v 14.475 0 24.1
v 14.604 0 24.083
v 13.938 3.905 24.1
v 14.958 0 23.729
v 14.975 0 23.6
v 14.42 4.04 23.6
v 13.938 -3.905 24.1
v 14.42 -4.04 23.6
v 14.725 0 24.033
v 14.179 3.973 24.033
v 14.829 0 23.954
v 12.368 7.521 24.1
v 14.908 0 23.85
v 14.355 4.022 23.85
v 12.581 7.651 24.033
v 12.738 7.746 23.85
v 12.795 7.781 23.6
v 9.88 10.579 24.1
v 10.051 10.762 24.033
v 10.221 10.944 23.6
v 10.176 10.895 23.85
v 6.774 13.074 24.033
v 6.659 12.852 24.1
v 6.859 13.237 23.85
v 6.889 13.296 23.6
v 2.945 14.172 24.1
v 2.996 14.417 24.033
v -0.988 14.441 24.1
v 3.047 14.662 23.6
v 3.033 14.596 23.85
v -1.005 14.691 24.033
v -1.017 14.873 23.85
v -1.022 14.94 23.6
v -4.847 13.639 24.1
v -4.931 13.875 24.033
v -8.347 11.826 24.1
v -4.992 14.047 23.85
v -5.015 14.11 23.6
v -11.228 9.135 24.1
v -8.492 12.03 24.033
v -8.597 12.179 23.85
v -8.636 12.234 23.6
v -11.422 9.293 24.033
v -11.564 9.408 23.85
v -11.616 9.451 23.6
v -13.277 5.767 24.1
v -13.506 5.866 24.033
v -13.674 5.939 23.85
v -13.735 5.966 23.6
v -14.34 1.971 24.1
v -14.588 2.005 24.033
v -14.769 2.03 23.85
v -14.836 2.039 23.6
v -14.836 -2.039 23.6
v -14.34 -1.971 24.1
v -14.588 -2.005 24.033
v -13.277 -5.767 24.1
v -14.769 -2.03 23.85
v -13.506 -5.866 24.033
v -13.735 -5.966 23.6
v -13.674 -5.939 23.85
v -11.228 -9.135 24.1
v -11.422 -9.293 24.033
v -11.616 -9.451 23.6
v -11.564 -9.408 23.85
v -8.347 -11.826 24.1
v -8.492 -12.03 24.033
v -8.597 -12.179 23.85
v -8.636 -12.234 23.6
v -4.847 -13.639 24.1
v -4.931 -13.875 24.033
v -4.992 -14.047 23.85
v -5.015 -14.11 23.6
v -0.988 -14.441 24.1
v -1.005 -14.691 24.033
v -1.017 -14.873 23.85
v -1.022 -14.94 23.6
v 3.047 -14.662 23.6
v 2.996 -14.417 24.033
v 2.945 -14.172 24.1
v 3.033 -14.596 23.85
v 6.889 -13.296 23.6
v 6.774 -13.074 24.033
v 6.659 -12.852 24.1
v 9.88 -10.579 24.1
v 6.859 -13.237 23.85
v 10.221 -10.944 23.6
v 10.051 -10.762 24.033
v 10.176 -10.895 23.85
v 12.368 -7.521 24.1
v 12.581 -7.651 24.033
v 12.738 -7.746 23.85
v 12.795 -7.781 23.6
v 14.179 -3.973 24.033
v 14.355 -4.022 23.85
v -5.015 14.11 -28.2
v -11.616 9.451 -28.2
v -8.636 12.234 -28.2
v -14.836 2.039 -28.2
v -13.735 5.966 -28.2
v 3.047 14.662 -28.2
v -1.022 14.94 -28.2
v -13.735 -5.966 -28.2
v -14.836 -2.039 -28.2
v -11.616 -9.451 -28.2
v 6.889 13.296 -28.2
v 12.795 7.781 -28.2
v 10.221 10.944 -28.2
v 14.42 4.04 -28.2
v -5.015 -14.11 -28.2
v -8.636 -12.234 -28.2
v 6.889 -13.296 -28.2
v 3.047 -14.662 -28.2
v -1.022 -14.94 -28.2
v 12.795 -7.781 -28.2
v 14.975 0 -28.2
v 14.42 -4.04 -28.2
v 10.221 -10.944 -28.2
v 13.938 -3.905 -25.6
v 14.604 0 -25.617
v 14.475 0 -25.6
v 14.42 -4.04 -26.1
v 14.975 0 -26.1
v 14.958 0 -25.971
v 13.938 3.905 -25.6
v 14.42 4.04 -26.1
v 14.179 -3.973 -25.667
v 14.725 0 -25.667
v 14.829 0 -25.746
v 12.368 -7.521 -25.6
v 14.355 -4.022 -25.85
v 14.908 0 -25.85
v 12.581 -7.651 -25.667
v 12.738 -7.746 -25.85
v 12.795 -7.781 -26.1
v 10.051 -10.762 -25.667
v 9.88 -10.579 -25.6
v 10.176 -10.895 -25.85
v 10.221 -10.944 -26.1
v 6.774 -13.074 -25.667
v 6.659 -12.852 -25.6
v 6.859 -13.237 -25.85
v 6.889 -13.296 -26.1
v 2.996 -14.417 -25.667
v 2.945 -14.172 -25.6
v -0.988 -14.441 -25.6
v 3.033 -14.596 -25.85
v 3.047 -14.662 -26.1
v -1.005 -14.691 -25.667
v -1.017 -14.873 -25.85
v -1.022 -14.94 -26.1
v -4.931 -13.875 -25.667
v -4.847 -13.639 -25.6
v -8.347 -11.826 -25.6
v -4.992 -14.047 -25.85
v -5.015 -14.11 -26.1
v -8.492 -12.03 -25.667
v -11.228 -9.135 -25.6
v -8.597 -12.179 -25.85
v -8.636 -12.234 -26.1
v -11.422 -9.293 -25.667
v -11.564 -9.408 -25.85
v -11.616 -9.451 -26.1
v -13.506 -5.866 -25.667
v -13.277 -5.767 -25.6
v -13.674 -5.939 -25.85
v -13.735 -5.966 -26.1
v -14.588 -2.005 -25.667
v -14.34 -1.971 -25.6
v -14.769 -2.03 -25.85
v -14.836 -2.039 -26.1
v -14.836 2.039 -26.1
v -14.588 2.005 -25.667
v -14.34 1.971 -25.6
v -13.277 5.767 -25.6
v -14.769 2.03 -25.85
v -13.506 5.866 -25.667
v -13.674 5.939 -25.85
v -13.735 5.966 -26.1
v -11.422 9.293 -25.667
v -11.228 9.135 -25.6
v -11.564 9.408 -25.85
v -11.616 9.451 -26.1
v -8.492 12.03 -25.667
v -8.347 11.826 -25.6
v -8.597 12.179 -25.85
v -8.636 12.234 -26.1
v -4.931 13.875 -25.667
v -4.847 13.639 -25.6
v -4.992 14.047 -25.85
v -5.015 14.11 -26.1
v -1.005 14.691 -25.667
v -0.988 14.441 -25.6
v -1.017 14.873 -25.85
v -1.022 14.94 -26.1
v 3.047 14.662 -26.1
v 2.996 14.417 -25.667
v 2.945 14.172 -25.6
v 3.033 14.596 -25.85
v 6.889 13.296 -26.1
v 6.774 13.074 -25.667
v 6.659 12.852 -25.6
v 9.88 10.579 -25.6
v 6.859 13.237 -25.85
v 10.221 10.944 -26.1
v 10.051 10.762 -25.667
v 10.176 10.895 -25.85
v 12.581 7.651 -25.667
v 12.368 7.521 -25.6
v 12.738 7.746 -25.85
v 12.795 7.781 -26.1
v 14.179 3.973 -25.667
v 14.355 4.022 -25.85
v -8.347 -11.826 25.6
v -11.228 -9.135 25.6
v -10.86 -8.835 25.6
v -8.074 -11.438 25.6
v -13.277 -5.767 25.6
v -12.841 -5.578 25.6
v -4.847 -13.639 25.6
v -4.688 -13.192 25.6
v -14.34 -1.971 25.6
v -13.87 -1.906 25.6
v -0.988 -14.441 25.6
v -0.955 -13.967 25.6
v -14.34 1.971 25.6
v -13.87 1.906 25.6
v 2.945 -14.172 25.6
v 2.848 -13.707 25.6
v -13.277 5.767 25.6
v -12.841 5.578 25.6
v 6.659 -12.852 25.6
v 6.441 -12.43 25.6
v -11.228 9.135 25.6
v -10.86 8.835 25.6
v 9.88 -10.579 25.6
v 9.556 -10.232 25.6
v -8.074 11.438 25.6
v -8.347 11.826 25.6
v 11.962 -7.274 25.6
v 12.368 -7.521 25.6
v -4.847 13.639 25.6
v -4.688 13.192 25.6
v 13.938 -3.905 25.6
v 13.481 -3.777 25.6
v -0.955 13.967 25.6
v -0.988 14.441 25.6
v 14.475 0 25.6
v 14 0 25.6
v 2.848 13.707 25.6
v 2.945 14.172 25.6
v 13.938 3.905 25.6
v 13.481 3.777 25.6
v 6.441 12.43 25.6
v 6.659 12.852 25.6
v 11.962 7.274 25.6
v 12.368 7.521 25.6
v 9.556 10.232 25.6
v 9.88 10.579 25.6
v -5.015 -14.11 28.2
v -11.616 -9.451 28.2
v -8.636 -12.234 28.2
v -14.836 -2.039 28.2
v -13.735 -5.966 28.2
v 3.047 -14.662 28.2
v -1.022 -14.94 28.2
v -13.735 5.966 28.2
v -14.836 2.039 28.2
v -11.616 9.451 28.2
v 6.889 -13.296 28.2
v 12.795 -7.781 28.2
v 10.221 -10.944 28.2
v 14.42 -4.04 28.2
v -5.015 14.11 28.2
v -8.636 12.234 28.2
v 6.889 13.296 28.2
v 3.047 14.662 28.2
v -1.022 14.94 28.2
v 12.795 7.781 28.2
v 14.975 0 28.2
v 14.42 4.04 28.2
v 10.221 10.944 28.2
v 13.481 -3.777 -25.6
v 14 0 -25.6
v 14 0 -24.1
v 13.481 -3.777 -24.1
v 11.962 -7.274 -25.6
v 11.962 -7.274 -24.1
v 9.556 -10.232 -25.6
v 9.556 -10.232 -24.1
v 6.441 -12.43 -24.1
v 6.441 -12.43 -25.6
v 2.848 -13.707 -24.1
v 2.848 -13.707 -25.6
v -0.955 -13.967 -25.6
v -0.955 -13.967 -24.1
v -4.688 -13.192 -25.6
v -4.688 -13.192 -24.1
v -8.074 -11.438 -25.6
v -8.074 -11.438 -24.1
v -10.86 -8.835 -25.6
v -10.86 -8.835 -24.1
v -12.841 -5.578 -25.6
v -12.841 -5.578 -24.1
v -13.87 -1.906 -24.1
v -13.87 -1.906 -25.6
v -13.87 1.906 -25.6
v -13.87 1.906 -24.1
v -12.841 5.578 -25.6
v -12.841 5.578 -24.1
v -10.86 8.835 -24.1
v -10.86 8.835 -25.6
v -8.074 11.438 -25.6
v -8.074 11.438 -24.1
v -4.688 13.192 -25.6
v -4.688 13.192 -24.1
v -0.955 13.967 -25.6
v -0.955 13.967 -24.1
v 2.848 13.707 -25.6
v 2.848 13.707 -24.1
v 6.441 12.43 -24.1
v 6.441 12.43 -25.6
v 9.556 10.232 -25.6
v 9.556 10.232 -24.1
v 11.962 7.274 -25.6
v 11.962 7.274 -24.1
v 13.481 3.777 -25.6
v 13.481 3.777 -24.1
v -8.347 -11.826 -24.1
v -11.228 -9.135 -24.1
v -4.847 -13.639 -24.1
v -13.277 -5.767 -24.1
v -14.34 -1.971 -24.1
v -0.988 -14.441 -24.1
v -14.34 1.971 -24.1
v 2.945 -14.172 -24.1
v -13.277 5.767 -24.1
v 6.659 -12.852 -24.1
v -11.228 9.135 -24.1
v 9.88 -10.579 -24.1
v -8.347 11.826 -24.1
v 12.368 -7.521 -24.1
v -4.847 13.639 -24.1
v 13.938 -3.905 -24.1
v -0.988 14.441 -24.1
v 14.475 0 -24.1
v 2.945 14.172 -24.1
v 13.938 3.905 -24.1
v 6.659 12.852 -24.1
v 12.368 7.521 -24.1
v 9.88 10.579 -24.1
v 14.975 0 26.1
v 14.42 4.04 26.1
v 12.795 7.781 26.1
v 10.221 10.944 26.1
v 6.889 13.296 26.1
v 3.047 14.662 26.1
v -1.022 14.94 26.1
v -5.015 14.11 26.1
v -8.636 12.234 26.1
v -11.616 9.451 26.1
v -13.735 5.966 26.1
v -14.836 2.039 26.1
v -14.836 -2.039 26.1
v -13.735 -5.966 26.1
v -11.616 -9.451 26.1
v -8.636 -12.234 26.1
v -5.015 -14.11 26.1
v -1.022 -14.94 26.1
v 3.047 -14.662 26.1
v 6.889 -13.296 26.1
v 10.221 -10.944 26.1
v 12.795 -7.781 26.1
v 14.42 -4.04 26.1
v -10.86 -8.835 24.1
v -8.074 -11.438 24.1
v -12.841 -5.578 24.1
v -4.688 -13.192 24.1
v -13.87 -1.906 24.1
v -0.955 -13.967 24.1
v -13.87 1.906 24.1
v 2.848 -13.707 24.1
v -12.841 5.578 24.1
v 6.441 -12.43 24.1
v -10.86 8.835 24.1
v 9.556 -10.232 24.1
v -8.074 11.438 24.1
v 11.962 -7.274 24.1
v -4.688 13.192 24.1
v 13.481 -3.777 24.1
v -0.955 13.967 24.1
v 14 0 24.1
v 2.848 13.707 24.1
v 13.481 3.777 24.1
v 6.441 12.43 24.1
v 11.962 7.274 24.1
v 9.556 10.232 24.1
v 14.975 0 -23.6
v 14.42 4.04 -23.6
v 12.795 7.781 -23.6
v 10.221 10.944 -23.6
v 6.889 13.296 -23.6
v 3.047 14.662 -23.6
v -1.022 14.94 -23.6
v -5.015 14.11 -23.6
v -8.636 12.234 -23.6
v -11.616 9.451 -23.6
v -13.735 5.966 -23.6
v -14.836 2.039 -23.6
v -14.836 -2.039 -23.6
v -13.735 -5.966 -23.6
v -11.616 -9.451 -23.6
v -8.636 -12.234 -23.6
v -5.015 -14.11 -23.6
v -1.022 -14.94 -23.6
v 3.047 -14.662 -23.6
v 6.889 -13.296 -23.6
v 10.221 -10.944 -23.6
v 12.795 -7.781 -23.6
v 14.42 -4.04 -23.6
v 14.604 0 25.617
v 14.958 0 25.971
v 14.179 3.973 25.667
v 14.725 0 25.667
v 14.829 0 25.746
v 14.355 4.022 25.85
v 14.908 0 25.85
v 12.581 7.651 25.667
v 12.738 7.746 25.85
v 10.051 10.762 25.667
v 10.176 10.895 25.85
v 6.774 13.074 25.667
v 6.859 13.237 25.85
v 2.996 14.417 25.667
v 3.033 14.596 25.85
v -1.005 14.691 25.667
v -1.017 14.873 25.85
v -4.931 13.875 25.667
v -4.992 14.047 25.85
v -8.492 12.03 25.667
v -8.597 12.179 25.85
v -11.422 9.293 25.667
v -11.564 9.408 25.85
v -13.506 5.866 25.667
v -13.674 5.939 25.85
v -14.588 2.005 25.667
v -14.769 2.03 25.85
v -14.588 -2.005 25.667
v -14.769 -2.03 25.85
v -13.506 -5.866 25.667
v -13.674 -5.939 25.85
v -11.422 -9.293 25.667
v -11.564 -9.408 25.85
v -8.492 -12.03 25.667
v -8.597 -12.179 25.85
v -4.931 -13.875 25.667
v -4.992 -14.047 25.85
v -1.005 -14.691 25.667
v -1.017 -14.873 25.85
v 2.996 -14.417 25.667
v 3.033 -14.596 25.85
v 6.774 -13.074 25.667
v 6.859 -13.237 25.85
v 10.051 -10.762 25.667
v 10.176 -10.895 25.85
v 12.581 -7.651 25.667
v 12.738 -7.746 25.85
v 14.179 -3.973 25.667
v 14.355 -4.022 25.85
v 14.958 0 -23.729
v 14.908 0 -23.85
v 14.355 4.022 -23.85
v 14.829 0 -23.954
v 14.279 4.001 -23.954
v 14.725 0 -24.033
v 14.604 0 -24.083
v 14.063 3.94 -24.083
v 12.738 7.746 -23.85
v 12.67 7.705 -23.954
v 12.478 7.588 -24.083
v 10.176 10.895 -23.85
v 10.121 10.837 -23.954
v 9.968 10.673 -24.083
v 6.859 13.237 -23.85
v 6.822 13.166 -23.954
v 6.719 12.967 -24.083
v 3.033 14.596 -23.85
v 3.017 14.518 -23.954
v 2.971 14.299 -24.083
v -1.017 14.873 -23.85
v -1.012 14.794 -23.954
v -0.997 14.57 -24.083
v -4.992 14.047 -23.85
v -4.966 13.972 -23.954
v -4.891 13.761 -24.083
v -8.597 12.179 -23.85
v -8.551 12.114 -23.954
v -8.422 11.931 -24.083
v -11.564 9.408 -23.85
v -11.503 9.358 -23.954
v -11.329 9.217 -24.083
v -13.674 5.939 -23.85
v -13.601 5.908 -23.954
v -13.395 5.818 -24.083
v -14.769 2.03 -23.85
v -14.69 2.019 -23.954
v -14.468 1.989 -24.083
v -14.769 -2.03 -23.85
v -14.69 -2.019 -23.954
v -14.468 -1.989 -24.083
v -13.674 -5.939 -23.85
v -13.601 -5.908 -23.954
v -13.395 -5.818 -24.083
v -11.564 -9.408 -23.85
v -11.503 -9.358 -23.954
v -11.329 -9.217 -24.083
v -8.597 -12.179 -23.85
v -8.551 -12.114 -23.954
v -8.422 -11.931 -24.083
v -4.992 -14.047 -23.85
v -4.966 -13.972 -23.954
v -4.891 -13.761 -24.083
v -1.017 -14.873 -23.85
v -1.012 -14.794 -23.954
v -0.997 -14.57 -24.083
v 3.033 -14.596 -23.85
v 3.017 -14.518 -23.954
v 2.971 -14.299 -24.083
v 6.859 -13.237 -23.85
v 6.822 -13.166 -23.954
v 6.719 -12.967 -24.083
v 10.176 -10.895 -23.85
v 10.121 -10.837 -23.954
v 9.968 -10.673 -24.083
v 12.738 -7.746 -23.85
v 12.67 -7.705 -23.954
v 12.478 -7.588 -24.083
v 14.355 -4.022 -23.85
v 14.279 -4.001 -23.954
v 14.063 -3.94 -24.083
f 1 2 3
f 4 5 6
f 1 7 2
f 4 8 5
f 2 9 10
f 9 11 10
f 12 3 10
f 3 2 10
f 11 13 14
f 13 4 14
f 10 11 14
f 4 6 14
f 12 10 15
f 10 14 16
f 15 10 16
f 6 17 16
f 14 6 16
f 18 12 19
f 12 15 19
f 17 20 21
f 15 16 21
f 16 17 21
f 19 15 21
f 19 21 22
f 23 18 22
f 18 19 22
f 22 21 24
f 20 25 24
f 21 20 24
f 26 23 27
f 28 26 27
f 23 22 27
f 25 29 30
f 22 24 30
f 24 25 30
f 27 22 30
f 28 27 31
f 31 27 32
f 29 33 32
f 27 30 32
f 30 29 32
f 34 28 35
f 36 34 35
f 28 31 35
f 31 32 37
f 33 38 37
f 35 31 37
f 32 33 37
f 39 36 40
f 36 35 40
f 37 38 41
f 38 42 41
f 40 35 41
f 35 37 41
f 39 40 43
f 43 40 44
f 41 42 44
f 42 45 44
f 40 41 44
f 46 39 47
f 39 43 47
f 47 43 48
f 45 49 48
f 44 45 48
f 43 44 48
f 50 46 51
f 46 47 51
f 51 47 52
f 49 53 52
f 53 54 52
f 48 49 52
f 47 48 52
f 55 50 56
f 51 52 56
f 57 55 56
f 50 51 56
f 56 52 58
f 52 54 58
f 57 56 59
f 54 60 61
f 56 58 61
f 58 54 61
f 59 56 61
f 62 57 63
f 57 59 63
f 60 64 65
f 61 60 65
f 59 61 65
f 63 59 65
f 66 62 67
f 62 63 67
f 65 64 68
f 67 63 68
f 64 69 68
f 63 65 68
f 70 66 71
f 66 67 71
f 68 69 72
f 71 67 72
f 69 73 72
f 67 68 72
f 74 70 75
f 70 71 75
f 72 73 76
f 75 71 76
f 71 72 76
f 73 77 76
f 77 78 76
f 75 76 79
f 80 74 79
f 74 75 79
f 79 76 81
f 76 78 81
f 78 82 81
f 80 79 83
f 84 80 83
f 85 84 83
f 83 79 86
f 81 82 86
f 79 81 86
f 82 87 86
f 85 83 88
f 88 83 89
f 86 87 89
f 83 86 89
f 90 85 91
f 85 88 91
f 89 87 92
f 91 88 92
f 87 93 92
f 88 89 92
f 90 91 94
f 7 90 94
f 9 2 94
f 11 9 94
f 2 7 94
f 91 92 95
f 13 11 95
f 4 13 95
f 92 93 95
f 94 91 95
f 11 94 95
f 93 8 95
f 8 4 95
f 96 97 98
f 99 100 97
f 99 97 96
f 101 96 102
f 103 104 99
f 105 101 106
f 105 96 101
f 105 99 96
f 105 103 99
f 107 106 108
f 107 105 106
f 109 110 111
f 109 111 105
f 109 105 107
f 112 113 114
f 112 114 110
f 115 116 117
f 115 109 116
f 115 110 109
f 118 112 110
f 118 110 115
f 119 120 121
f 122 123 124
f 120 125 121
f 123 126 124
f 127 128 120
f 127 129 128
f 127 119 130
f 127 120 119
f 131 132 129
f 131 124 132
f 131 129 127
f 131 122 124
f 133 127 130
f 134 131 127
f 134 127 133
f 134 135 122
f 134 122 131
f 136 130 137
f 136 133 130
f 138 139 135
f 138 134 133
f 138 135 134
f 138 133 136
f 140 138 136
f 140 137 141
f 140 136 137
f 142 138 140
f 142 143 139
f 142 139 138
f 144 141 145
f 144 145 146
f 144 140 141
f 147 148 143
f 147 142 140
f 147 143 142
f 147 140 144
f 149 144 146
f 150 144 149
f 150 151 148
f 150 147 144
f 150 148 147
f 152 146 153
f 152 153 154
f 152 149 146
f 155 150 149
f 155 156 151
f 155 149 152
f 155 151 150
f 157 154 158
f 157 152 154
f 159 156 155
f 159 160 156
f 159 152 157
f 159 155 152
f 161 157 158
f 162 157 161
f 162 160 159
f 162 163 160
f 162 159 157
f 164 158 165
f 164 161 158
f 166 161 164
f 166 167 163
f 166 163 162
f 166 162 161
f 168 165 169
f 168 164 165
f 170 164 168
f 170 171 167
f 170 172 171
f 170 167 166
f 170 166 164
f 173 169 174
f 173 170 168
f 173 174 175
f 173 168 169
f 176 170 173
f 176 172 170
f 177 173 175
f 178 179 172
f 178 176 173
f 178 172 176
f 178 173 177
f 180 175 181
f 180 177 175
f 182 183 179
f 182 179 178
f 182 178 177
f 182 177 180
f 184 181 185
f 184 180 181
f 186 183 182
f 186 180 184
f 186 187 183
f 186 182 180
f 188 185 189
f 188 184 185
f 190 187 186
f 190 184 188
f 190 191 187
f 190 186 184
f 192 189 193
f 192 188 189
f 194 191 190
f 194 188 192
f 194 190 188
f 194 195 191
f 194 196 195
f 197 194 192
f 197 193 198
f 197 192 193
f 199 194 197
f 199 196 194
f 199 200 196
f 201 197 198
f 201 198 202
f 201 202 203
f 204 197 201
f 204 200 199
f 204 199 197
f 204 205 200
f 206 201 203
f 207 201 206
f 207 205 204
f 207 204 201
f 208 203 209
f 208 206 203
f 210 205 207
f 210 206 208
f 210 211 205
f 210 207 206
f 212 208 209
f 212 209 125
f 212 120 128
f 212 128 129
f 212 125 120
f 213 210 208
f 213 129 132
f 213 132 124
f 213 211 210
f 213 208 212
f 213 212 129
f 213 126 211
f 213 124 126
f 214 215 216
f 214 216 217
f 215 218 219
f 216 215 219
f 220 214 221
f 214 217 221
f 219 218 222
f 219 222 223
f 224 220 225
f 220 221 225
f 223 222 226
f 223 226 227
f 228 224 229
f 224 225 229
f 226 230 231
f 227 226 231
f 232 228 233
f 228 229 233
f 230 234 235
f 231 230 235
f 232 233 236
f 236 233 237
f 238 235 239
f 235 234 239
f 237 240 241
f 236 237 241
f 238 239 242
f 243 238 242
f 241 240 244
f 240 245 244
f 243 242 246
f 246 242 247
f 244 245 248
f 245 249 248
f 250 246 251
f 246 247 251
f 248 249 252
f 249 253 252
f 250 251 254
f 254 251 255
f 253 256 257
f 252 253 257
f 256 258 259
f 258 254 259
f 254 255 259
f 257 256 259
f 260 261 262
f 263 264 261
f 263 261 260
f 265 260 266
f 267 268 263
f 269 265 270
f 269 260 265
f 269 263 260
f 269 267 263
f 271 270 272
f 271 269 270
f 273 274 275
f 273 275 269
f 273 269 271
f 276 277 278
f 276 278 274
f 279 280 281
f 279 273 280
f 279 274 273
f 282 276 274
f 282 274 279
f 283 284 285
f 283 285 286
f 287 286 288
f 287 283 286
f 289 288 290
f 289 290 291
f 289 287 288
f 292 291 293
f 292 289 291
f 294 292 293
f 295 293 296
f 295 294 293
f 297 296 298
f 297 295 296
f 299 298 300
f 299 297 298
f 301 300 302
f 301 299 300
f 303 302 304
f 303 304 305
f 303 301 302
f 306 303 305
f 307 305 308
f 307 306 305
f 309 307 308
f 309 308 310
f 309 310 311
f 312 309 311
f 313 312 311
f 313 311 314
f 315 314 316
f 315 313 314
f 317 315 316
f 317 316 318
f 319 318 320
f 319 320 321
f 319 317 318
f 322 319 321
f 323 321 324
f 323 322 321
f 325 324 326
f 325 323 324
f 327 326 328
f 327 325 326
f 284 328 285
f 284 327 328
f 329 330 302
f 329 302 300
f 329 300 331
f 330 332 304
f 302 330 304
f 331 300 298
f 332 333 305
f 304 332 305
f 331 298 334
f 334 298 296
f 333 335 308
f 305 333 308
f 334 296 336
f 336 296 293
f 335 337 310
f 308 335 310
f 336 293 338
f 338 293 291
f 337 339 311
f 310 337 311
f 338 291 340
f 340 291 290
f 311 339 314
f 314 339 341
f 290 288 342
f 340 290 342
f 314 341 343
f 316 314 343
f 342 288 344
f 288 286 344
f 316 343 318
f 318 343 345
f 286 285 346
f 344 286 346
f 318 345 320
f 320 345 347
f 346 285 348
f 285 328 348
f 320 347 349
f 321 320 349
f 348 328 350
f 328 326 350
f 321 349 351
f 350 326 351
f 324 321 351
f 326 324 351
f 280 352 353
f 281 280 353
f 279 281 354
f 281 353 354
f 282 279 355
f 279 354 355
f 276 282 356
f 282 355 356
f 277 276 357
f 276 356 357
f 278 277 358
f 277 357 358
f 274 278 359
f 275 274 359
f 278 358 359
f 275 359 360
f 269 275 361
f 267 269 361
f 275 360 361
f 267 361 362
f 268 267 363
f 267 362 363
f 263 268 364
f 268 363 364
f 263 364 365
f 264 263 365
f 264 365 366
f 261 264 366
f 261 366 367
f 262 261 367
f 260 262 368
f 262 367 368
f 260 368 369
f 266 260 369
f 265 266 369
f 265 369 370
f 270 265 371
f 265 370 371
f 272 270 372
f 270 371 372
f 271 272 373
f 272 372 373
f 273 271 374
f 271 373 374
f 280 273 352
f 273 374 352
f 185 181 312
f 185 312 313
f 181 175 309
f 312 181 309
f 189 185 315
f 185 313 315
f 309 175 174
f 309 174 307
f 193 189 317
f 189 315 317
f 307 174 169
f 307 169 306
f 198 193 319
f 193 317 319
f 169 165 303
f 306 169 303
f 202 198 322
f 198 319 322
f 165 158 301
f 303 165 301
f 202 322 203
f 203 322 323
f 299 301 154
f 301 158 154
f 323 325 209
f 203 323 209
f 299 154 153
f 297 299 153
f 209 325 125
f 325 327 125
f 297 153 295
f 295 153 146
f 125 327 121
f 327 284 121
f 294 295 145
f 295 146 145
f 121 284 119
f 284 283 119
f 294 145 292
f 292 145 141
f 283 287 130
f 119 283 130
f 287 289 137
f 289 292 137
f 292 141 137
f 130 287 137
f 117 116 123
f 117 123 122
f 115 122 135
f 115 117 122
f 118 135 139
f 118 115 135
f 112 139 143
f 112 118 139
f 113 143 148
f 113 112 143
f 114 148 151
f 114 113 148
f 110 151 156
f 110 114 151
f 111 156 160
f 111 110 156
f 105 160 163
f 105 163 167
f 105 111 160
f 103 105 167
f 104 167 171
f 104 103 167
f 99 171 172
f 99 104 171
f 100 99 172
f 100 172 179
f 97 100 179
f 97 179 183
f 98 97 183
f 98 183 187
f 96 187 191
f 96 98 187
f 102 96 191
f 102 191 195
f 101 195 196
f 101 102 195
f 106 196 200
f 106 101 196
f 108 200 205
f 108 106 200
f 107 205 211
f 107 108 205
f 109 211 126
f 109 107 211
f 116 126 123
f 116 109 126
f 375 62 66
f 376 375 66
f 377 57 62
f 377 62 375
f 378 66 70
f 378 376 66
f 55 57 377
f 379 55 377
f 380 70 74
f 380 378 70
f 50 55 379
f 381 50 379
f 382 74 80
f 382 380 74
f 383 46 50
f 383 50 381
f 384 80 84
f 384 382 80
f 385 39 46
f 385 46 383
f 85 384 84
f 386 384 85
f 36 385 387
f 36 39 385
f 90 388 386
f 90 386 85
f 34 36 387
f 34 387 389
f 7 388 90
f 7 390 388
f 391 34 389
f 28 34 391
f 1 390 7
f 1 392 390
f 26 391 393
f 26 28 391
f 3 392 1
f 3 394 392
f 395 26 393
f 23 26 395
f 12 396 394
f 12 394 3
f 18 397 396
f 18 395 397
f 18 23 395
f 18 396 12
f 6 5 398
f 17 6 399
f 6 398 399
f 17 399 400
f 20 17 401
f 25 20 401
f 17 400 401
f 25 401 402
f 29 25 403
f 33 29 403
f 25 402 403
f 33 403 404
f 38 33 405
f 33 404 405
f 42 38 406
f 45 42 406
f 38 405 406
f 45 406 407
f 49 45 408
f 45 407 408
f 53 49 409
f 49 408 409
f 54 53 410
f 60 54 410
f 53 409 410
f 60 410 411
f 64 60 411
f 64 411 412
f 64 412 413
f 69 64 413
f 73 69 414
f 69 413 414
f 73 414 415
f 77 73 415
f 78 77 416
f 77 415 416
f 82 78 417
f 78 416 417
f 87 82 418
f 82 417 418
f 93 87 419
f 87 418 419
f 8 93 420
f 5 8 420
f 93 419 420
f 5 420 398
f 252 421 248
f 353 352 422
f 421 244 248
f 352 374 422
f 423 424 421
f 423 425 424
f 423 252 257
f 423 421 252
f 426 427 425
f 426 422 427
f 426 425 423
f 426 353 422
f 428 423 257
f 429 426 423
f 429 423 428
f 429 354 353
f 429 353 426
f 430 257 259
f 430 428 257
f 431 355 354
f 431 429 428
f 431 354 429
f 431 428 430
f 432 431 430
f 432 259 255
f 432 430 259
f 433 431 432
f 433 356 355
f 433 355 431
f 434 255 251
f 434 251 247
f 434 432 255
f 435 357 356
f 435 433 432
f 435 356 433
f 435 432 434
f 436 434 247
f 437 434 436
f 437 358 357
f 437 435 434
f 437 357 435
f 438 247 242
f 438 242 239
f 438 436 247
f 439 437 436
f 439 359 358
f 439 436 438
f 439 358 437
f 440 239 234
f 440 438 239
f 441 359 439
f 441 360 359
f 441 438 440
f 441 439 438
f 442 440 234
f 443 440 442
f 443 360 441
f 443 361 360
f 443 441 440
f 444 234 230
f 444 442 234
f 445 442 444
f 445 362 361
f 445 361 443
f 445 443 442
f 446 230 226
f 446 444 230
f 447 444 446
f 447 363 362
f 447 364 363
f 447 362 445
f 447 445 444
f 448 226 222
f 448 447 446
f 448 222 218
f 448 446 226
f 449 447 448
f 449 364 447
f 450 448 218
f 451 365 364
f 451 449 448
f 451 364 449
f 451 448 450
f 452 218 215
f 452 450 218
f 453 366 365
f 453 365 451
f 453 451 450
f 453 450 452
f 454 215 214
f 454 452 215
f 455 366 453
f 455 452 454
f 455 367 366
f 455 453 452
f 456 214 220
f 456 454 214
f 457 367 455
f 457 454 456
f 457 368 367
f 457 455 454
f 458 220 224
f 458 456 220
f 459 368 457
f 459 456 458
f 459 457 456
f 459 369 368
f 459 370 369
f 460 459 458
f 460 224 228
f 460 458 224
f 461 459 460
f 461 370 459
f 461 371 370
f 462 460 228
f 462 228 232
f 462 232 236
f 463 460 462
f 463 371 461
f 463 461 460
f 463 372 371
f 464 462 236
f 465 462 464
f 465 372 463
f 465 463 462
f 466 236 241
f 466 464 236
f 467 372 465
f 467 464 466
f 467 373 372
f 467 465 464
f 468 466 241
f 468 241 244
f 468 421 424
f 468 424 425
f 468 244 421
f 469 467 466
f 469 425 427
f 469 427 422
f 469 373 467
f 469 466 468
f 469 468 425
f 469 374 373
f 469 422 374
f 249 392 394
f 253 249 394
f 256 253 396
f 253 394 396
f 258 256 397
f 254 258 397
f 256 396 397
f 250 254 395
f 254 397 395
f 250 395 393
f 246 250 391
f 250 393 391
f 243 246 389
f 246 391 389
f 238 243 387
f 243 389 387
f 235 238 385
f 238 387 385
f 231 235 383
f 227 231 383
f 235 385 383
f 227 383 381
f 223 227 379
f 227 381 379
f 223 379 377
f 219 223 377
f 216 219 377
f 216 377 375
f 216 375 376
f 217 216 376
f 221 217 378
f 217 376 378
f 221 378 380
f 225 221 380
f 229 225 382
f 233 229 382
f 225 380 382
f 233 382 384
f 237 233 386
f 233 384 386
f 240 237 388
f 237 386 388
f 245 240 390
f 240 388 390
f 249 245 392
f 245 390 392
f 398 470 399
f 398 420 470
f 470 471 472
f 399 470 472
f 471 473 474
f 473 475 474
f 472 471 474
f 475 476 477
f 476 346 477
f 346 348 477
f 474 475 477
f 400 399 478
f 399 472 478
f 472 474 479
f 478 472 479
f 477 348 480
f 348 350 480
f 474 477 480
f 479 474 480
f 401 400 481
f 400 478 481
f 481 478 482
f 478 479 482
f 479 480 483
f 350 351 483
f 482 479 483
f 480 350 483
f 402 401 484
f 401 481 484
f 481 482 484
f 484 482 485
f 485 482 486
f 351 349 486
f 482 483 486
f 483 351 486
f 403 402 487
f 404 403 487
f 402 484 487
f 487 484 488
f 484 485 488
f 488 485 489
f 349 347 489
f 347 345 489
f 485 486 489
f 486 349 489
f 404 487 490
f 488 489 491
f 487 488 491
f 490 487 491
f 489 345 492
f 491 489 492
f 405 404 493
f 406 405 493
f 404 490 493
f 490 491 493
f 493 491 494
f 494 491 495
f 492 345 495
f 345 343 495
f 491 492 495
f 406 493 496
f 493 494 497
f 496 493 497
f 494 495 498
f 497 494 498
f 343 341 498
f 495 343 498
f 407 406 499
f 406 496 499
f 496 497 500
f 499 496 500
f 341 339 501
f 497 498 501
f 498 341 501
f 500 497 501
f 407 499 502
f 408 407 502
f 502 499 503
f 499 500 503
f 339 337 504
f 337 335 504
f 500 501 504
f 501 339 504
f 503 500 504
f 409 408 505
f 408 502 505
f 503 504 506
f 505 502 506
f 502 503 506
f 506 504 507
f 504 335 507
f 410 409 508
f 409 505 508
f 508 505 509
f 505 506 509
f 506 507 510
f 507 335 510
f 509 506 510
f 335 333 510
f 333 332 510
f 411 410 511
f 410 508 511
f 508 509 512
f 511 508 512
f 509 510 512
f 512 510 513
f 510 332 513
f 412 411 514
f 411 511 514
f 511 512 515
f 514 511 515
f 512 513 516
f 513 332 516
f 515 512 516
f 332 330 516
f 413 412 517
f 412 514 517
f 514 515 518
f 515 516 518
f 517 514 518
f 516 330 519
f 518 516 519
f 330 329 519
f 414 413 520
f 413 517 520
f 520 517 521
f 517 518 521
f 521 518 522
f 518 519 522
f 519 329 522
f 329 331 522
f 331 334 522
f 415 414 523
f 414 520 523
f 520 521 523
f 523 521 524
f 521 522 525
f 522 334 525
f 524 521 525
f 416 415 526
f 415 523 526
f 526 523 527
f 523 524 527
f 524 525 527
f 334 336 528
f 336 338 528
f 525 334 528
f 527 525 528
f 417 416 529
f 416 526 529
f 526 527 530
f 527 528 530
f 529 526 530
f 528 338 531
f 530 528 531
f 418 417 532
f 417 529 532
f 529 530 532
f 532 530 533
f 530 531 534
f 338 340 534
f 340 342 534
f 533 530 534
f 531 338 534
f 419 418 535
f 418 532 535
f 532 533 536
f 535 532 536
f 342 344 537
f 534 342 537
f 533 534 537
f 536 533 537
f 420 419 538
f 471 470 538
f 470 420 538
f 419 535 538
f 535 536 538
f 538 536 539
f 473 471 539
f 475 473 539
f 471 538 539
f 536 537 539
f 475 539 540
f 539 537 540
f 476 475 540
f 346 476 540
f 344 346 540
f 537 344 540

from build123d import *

# Parameters (mm, degrees)
BOSS_EXTRUDE1_DEPTH      = 24.1
BOSS_EXTRUDE1_DEPTH_BACK = 24.1
SKETCH1_R                = 14.975
SKETCH2_R                = 14
BOSS_EXTRUDE2_DEPTH      = 1.5
SKETCH3_R                = 14.975
BOSS_EXTRUDE3_DEPTH      = 2.6
BOSS_EXTRUDE4_START      = 1.5
SKETCH4_R                = 14
BOSS_EXTRUDE4_DEPTH      = 1.5
BOSS_EXTRUDE5_START      = 2.6
SKETCH5_R                = 14.975
BOSS_EXTRUDE5_DEPTH      = 2.6
FILLET1_R                = 0.5
FILLET3_R                = 0.5


with BuildPart() as part:
    # Sketch1 → Boss-Extrude1 (new, two sides: drawn at the far end of the back side and taken through both)
    with BuildSketch(Plane.XY.offset(-BOSS_EXTRUDE1_DEPTH_BACK)):
        Circle(SKETCH1_R)
    extrude(amount=BOSS_EXTRUDE1_DEPTH + BOSS_EXTRUDE1_DEPTH_BACK)

    # Sketch2 → Boss-Extrude2 (add)
    with BuildSketch(Plane.XY.offset(24.1)):
        Circle(SKETCH2_R)
    extrude(amount=BOSS_EXTRUDE2_DEPTH)

    # Sketch3 → Boss-Extrude3 (add)
    with BuildSketch(Plane.XY.offset(25.6)):
        Circle(SKETCH3_R)
    extrude(amount=BOSS_EXTRUDE3_DEPTH)

    # Sketch4 → Boss-Extrude4 (add)
    with BuildSketch(Plane(origin=(0, 0, -24.1), x_dir=(-1, 0, 0), z_dir=(0, 0, -1)).offset(BOSS_EXTRUDE4_START)):
        Circle(SKETCH4_R)
    extrude(amount=-BOSS_EXTRUDE4_DEPTH)

    # Sketch5 → Boss-Extrude5 (add)
    with BuildSketch(Plane(origin=(0, 0, -25.6), x_dir=(-1, 0, 0), z_dir=(0, 0, -1)).offset(BOSS_EXTRUDE5_START)):
        Circle(SKETCH5_R)
    extrude(amount=-BOSS_EXTRUDE5_DEPTH)

    # Fillet1
    fillet1_edges = [part.edges().sort_by_distance(p)[0] for p in [
        (-14.975, 0, 25.6),
    ]]
    fillet(fillet1_edges, radius=FILLET1_R)

    # Fillet3
    fillet3_edges = [part.edges().sort_by_distance(p)[0] for p in [
        (14.975, 0, -25.6),
        (-14.975, 0, -24.1),
        (-14.975, 0, 24.1),
    ]]
    fillet(fillet3_edges, radius=FILLET3_R)


solid = part.part
